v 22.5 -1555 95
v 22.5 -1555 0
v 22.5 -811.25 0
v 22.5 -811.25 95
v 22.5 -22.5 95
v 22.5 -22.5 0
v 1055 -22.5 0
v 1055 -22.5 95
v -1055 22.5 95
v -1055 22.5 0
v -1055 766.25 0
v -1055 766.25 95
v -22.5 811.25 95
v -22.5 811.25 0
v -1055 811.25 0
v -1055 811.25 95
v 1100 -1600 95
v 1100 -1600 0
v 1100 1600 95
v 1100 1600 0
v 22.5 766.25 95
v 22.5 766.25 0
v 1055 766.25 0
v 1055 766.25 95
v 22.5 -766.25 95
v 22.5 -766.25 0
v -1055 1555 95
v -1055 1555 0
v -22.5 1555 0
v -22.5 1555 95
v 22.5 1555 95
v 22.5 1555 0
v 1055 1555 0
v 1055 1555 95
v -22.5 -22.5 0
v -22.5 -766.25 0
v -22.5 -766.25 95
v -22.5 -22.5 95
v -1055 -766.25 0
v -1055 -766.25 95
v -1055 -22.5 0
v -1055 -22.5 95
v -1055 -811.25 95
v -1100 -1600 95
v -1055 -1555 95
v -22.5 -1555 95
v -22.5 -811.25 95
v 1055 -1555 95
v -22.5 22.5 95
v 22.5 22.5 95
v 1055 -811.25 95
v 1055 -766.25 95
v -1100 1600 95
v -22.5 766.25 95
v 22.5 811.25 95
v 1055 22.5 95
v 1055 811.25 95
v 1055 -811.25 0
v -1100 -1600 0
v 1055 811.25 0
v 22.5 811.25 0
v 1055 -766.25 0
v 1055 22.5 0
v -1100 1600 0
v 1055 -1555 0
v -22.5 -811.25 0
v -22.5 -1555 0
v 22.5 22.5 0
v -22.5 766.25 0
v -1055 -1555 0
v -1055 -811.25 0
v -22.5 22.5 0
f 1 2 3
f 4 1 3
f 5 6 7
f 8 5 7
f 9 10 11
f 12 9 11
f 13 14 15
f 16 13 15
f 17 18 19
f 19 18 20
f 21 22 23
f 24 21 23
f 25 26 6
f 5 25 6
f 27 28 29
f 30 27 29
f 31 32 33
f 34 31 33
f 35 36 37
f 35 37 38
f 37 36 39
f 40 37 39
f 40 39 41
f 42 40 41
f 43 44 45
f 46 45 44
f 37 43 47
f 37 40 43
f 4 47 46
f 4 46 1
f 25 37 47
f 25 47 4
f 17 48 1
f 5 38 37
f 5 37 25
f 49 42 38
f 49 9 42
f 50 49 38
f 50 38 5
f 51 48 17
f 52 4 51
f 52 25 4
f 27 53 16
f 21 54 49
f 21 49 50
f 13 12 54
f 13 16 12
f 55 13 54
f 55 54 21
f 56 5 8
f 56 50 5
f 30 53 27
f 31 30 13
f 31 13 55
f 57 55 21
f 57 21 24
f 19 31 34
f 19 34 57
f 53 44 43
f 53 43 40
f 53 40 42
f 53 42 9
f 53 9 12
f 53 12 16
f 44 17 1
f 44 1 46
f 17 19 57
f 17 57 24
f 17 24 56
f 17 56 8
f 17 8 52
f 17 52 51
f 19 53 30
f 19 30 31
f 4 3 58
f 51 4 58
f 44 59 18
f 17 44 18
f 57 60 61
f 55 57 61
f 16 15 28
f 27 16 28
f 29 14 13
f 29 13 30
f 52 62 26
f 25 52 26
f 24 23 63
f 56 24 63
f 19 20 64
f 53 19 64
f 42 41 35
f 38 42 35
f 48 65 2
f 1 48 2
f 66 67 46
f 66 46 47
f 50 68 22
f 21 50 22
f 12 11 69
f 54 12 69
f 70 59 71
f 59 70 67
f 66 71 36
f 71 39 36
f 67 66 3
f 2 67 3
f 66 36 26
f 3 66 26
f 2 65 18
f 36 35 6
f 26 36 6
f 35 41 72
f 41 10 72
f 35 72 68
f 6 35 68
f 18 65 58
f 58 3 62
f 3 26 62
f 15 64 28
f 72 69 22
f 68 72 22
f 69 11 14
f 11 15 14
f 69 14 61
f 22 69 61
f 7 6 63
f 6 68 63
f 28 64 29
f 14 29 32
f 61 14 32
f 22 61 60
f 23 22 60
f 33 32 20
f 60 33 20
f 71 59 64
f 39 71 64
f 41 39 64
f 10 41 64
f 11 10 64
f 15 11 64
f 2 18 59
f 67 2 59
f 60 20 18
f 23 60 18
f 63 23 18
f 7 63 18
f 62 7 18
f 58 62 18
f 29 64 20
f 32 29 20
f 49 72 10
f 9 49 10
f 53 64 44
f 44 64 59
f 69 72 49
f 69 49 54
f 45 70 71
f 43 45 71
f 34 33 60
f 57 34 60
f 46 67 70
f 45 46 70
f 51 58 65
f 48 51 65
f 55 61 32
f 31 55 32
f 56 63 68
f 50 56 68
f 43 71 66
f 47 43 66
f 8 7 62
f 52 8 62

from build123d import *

# Parameters (mm, degrees)
F0_W     = 45
F0_H     = 743.75
F1_DEPTH = 95


with BuildPart() as f1:
    # F0 (on Top) → F1 (new body)
    with BuildSketch(Plane.XY):
        Polygon((1055, 1555), (1055, 1600), (-1055, 1600), (-1055, 1555), (-22.5, 1555), (22.5, 1555), align=None)
        Polygon((-1055, 1555), (-1055, 1600), (-1100, 1600), (-1100, -1600), (-1055, -1600), (-1055, -1555), (-1055, -811.25), (-1055, -766.25), (-1055, -22.5), (-1055, 22.5), (-1055, 766.25), (-1055, 811.25), align=None)
        Polygon((1100, -1600), (1100, 1600), (1055, 1600), (1055, 1555), (1055, 811.25), (1055, 766.25), (1055, 22.5), (1055, -22.5), (1055, -766.25), (1055, -811.25), (1055, -1555), (1055, -1600), align=None)
        with Locations((0, -394.375)):
            Rectangle(F0_W, F0_H)
        Polygon((22.5, -811.25), (1055, -811.25), (1055, -766.25), (22.5, -766.25), (-22.5, -766.25), (-1055, -766.25), (-1055, -811.25), (-22.5, -811.25), align=None)
        with Locations((0, -1183.125)):
            Rectangle(F0_W, F0_H)
        Polygon((1055, -22.5), (1055, 22.5), (22.5, 22.5), (-22.5, 22.5), (-1055, 22.5), (-1055, -22.5), (-22.5, -22.5), (22.5, -22.5), align=None)
        Polygon((1055, 766.25), (1055, 811.25), (22.5, 811.25), (-22.5, 811.25), (-1055, 811.25), (-1055, 766.25), (-22.5, 766.25), (22.5, 766.25), align=None)
        with Locations((0, 394.375)):
            Rectangle(F0_W, F0_H)
        with Locations((0, 1183.125)):
            Rectangle(F0_W, F0_H)
        Polygon((-1055, -1600), (1055, -1600), (1055, -1555), (22.5, -1555), (-22.5, -1555), (-1055, -1555), align=None)
    extrude(amount=F1_DEPTH)


solid = f1.part
